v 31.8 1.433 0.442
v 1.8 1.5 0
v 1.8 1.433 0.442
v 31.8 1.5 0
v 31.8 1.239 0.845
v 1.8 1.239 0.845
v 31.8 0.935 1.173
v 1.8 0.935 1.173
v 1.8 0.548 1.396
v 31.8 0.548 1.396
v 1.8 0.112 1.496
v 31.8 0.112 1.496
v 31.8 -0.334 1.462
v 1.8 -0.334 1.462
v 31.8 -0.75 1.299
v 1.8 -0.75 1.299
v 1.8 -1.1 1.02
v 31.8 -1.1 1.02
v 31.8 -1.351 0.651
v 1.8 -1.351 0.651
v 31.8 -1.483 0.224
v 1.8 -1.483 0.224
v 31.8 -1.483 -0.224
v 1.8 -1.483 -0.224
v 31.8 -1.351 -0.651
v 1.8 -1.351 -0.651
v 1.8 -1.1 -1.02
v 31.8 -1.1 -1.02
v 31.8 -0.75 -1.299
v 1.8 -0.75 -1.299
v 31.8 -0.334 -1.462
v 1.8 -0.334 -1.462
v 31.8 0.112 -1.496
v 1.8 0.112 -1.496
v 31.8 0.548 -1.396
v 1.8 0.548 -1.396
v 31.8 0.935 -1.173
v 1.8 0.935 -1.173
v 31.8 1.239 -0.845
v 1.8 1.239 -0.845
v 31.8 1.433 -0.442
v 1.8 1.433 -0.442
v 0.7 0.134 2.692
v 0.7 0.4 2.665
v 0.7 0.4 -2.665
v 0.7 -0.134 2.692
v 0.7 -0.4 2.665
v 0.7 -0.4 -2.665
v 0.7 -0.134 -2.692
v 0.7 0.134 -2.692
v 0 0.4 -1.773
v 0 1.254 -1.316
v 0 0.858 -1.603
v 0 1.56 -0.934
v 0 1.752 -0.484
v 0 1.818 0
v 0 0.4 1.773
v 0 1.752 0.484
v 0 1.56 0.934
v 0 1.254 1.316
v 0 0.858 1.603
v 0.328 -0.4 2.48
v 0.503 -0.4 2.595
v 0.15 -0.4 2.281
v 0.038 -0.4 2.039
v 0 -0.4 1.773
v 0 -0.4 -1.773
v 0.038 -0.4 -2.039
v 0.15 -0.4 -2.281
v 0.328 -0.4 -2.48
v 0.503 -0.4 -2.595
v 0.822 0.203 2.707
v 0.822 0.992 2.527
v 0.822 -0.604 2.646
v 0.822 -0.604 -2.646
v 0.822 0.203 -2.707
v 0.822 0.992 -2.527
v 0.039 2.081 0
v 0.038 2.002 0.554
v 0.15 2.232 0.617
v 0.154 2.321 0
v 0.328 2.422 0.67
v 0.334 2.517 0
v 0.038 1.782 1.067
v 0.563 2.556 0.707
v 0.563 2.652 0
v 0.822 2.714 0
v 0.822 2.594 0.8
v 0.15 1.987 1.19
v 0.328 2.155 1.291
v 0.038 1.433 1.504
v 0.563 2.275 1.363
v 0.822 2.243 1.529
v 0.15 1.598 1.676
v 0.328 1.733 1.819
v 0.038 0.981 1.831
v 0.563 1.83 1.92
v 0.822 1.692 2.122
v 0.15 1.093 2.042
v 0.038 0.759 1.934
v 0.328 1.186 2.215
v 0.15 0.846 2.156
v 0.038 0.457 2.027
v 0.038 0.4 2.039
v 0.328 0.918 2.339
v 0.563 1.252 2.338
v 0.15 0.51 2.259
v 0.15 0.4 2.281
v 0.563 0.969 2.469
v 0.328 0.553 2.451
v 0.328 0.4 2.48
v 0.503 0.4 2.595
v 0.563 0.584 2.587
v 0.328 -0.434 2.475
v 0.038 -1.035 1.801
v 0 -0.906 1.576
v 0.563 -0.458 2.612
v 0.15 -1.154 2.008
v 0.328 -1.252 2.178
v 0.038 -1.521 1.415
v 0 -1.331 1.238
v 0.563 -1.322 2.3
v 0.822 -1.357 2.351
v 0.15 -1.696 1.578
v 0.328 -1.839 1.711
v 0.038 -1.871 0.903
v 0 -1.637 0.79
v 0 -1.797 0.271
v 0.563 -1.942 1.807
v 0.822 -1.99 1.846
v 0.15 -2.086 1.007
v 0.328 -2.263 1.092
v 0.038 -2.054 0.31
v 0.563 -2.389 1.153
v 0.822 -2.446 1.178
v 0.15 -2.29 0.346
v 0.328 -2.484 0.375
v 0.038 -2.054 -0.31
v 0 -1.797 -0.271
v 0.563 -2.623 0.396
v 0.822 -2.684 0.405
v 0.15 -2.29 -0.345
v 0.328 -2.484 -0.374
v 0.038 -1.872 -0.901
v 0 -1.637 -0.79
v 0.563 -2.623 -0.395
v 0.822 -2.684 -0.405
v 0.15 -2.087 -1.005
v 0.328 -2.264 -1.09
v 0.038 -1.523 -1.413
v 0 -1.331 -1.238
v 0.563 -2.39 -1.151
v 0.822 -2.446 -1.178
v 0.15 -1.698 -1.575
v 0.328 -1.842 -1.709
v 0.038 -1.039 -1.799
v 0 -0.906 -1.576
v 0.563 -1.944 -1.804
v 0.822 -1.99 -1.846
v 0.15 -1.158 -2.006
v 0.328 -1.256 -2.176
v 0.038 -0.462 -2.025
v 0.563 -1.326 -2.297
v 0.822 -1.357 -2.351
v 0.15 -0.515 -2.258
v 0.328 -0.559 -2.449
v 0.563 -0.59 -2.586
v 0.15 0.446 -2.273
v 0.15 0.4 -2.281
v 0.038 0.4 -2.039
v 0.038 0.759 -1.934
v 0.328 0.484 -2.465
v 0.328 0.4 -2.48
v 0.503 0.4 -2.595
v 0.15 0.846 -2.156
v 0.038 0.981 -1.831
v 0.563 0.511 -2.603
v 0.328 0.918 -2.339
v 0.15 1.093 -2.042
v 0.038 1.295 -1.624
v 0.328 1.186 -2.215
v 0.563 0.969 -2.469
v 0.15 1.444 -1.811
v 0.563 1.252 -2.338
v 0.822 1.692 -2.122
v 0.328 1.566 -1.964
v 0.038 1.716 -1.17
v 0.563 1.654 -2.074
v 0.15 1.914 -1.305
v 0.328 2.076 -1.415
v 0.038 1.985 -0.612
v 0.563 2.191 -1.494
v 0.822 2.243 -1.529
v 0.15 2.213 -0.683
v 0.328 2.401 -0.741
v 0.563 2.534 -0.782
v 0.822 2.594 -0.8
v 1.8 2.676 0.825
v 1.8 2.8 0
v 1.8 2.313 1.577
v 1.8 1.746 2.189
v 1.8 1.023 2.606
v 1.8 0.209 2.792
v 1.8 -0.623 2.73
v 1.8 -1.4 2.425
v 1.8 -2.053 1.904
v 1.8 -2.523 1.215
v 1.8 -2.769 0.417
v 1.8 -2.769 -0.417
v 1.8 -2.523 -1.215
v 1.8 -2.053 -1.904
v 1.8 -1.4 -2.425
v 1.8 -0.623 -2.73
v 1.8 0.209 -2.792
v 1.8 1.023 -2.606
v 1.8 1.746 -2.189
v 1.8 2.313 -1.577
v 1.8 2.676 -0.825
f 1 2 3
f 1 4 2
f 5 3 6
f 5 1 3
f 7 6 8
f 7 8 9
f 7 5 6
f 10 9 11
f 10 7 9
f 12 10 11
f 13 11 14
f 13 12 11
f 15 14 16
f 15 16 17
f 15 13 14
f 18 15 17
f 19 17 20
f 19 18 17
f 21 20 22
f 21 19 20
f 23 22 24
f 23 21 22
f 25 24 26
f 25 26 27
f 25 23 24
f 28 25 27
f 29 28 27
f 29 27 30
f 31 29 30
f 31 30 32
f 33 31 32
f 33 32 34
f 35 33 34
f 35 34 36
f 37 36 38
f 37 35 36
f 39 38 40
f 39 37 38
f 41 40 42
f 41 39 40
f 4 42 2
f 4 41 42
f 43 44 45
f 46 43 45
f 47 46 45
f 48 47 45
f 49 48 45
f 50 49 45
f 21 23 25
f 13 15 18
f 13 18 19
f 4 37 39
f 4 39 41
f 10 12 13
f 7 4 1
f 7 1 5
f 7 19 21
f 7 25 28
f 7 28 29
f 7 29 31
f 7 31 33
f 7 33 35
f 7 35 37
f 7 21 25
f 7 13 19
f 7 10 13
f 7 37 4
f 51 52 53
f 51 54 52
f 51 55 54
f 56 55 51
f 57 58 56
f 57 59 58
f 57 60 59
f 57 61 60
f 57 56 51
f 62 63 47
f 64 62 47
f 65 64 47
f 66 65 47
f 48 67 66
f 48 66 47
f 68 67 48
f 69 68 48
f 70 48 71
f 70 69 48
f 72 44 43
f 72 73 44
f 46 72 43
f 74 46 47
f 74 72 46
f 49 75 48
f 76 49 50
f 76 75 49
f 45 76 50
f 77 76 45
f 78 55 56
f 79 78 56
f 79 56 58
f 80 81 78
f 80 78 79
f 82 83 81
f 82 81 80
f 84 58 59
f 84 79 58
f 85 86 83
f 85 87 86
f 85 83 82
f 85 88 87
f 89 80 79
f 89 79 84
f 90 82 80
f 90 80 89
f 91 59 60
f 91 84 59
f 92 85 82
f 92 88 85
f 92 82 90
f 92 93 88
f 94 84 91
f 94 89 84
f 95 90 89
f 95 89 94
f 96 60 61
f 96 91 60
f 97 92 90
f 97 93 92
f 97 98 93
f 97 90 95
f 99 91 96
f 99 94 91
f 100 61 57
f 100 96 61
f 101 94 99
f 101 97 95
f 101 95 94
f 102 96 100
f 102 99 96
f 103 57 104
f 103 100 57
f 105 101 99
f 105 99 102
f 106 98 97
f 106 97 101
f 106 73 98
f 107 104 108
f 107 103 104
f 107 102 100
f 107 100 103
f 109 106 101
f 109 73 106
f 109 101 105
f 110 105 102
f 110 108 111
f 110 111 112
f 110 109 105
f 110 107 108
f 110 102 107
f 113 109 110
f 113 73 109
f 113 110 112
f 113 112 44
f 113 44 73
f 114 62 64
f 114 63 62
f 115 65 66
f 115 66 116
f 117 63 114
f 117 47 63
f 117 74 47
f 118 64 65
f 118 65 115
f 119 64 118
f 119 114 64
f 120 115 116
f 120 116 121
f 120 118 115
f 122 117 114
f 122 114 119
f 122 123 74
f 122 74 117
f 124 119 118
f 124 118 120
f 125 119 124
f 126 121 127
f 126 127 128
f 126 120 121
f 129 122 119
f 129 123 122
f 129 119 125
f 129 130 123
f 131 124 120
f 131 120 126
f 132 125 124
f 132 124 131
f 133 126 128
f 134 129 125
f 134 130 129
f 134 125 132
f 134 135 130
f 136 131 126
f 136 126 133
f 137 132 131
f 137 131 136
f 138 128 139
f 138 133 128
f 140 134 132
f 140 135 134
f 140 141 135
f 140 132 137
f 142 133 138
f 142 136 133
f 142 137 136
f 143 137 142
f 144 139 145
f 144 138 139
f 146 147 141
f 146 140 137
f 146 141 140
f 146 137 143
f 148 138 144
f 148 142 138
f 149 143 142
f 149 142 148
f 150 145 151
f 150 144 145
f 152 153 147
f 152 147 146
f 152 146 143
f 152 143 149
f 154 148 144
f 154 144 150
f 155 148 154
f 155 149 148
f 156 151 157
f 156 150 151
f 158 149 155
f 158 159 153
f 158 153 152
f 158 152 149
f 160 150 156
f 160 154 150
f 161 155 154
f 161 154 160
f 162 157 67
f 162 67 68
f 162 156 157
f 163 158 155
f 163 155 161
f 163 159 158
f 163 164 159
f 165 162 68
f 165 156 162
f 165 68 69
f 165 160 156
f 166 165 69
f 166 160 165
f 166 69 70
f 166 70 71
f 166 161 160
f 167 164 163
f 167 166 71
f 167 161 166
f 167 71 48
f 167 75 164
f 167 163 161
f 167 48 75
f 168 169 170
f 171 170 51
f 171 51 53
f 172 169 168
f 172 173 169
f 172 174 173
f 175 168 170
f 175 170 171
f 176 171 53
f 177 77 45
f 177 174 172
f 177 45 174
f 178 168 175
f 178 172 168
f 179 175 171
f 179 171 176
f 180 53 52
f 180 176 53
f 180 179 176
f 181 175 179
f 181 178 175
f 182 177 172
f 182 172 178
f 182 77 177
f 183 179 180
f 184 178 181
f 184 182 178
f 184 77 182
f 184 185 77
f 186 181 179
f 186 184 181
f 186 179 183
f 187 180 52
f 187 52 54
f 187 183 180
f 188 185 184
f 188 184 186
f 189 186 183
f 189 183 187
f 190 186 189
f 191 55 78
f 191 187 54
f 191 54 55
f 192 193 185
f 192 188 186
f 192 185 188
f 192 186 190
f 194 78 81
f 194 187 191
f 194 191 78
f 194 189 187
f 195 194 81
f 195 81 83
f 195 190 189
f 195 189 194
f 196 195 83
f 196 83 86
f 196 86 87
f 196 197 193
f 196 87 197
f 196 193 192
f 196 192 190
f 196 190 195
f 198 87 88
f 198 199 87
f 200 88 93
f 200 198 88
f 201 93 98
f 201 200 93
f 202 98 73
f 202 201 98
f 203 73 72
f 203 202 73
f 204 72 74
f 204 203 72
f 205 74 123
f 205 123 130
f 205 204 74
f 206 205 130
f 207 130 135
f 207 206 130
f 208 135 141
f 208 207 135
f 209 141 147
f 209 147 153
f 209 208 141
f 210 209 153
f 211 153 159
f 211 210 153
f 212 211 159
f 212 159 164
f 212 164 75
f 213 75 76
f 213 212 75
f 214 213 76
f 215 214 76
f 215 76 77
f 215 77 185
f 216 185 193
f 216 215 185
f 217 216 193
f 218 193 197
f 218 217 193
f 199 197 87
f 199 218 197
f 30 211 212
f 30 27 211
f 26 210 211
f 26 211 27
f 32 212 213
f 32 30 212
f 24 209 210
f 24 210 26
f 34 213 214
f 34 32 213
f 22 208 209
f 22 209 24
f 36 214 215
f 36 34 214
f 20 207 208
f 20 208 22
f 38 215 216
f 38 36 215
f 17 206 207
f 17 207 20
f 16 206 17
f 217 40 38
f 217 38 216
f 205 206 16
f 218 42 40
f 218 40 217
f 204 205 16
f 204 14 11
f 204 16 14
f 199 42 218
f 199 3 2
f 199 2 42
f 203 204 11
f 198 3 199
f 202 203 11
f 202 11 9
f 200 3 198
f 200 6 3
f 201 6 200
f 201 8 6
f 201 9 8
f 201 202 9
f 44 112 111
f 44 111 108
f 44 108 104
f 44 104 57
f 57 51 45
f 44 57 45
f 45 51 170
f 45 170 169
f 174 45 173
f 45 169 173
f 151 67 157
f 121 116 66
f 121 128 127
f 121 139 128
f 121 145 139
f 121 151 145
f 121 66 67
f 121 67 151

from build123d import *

# Parameters (mm, degrees)
SKETCH2_W  = 5.6
SKETCH2_H  = 0.8
SLOT_DEPTH = 0.7


with BuildPart() as part:
    # Fillet2: read off the stored shape, not the designer's step
    # Fillet2 outline → Fillet2 (revolve)
    with BuildSketch(Plane.YX):
        with BuildLine():
            Line((1.5, 1.8), (1.5, 31.8))
            Line((1.5, 31.8), (0, 31.8))
            Line((0, 31.8), (0, 0))
            Line((0, 0), (1.817822349, 0))
            ThreePointArc((1.817822349, 0), (2.425853536, 0.236450397), (2.714397577, 0.821559832))
            Line((2.714397577, 0.821559832), (2.8, 1.8))
            Line((2.8, 1.8), (1.5, 1.8))
        make_face()
    revolve(axis=Axis((0, 0, 0), (1, 0, 0)))

    # Sketch2 → Slot (cut)
    with BuildSketch(Plane(origin=(0, 0, 0), x_dir=(0, 0, -1), z_dir=(1, 0, 0))):
        Rectangle(SKETCH2_W, SKETCH2_H)
    extrude(amount=SLOT_DEPTH, mode=Mode.SUBTRACT)


solid = part.part
